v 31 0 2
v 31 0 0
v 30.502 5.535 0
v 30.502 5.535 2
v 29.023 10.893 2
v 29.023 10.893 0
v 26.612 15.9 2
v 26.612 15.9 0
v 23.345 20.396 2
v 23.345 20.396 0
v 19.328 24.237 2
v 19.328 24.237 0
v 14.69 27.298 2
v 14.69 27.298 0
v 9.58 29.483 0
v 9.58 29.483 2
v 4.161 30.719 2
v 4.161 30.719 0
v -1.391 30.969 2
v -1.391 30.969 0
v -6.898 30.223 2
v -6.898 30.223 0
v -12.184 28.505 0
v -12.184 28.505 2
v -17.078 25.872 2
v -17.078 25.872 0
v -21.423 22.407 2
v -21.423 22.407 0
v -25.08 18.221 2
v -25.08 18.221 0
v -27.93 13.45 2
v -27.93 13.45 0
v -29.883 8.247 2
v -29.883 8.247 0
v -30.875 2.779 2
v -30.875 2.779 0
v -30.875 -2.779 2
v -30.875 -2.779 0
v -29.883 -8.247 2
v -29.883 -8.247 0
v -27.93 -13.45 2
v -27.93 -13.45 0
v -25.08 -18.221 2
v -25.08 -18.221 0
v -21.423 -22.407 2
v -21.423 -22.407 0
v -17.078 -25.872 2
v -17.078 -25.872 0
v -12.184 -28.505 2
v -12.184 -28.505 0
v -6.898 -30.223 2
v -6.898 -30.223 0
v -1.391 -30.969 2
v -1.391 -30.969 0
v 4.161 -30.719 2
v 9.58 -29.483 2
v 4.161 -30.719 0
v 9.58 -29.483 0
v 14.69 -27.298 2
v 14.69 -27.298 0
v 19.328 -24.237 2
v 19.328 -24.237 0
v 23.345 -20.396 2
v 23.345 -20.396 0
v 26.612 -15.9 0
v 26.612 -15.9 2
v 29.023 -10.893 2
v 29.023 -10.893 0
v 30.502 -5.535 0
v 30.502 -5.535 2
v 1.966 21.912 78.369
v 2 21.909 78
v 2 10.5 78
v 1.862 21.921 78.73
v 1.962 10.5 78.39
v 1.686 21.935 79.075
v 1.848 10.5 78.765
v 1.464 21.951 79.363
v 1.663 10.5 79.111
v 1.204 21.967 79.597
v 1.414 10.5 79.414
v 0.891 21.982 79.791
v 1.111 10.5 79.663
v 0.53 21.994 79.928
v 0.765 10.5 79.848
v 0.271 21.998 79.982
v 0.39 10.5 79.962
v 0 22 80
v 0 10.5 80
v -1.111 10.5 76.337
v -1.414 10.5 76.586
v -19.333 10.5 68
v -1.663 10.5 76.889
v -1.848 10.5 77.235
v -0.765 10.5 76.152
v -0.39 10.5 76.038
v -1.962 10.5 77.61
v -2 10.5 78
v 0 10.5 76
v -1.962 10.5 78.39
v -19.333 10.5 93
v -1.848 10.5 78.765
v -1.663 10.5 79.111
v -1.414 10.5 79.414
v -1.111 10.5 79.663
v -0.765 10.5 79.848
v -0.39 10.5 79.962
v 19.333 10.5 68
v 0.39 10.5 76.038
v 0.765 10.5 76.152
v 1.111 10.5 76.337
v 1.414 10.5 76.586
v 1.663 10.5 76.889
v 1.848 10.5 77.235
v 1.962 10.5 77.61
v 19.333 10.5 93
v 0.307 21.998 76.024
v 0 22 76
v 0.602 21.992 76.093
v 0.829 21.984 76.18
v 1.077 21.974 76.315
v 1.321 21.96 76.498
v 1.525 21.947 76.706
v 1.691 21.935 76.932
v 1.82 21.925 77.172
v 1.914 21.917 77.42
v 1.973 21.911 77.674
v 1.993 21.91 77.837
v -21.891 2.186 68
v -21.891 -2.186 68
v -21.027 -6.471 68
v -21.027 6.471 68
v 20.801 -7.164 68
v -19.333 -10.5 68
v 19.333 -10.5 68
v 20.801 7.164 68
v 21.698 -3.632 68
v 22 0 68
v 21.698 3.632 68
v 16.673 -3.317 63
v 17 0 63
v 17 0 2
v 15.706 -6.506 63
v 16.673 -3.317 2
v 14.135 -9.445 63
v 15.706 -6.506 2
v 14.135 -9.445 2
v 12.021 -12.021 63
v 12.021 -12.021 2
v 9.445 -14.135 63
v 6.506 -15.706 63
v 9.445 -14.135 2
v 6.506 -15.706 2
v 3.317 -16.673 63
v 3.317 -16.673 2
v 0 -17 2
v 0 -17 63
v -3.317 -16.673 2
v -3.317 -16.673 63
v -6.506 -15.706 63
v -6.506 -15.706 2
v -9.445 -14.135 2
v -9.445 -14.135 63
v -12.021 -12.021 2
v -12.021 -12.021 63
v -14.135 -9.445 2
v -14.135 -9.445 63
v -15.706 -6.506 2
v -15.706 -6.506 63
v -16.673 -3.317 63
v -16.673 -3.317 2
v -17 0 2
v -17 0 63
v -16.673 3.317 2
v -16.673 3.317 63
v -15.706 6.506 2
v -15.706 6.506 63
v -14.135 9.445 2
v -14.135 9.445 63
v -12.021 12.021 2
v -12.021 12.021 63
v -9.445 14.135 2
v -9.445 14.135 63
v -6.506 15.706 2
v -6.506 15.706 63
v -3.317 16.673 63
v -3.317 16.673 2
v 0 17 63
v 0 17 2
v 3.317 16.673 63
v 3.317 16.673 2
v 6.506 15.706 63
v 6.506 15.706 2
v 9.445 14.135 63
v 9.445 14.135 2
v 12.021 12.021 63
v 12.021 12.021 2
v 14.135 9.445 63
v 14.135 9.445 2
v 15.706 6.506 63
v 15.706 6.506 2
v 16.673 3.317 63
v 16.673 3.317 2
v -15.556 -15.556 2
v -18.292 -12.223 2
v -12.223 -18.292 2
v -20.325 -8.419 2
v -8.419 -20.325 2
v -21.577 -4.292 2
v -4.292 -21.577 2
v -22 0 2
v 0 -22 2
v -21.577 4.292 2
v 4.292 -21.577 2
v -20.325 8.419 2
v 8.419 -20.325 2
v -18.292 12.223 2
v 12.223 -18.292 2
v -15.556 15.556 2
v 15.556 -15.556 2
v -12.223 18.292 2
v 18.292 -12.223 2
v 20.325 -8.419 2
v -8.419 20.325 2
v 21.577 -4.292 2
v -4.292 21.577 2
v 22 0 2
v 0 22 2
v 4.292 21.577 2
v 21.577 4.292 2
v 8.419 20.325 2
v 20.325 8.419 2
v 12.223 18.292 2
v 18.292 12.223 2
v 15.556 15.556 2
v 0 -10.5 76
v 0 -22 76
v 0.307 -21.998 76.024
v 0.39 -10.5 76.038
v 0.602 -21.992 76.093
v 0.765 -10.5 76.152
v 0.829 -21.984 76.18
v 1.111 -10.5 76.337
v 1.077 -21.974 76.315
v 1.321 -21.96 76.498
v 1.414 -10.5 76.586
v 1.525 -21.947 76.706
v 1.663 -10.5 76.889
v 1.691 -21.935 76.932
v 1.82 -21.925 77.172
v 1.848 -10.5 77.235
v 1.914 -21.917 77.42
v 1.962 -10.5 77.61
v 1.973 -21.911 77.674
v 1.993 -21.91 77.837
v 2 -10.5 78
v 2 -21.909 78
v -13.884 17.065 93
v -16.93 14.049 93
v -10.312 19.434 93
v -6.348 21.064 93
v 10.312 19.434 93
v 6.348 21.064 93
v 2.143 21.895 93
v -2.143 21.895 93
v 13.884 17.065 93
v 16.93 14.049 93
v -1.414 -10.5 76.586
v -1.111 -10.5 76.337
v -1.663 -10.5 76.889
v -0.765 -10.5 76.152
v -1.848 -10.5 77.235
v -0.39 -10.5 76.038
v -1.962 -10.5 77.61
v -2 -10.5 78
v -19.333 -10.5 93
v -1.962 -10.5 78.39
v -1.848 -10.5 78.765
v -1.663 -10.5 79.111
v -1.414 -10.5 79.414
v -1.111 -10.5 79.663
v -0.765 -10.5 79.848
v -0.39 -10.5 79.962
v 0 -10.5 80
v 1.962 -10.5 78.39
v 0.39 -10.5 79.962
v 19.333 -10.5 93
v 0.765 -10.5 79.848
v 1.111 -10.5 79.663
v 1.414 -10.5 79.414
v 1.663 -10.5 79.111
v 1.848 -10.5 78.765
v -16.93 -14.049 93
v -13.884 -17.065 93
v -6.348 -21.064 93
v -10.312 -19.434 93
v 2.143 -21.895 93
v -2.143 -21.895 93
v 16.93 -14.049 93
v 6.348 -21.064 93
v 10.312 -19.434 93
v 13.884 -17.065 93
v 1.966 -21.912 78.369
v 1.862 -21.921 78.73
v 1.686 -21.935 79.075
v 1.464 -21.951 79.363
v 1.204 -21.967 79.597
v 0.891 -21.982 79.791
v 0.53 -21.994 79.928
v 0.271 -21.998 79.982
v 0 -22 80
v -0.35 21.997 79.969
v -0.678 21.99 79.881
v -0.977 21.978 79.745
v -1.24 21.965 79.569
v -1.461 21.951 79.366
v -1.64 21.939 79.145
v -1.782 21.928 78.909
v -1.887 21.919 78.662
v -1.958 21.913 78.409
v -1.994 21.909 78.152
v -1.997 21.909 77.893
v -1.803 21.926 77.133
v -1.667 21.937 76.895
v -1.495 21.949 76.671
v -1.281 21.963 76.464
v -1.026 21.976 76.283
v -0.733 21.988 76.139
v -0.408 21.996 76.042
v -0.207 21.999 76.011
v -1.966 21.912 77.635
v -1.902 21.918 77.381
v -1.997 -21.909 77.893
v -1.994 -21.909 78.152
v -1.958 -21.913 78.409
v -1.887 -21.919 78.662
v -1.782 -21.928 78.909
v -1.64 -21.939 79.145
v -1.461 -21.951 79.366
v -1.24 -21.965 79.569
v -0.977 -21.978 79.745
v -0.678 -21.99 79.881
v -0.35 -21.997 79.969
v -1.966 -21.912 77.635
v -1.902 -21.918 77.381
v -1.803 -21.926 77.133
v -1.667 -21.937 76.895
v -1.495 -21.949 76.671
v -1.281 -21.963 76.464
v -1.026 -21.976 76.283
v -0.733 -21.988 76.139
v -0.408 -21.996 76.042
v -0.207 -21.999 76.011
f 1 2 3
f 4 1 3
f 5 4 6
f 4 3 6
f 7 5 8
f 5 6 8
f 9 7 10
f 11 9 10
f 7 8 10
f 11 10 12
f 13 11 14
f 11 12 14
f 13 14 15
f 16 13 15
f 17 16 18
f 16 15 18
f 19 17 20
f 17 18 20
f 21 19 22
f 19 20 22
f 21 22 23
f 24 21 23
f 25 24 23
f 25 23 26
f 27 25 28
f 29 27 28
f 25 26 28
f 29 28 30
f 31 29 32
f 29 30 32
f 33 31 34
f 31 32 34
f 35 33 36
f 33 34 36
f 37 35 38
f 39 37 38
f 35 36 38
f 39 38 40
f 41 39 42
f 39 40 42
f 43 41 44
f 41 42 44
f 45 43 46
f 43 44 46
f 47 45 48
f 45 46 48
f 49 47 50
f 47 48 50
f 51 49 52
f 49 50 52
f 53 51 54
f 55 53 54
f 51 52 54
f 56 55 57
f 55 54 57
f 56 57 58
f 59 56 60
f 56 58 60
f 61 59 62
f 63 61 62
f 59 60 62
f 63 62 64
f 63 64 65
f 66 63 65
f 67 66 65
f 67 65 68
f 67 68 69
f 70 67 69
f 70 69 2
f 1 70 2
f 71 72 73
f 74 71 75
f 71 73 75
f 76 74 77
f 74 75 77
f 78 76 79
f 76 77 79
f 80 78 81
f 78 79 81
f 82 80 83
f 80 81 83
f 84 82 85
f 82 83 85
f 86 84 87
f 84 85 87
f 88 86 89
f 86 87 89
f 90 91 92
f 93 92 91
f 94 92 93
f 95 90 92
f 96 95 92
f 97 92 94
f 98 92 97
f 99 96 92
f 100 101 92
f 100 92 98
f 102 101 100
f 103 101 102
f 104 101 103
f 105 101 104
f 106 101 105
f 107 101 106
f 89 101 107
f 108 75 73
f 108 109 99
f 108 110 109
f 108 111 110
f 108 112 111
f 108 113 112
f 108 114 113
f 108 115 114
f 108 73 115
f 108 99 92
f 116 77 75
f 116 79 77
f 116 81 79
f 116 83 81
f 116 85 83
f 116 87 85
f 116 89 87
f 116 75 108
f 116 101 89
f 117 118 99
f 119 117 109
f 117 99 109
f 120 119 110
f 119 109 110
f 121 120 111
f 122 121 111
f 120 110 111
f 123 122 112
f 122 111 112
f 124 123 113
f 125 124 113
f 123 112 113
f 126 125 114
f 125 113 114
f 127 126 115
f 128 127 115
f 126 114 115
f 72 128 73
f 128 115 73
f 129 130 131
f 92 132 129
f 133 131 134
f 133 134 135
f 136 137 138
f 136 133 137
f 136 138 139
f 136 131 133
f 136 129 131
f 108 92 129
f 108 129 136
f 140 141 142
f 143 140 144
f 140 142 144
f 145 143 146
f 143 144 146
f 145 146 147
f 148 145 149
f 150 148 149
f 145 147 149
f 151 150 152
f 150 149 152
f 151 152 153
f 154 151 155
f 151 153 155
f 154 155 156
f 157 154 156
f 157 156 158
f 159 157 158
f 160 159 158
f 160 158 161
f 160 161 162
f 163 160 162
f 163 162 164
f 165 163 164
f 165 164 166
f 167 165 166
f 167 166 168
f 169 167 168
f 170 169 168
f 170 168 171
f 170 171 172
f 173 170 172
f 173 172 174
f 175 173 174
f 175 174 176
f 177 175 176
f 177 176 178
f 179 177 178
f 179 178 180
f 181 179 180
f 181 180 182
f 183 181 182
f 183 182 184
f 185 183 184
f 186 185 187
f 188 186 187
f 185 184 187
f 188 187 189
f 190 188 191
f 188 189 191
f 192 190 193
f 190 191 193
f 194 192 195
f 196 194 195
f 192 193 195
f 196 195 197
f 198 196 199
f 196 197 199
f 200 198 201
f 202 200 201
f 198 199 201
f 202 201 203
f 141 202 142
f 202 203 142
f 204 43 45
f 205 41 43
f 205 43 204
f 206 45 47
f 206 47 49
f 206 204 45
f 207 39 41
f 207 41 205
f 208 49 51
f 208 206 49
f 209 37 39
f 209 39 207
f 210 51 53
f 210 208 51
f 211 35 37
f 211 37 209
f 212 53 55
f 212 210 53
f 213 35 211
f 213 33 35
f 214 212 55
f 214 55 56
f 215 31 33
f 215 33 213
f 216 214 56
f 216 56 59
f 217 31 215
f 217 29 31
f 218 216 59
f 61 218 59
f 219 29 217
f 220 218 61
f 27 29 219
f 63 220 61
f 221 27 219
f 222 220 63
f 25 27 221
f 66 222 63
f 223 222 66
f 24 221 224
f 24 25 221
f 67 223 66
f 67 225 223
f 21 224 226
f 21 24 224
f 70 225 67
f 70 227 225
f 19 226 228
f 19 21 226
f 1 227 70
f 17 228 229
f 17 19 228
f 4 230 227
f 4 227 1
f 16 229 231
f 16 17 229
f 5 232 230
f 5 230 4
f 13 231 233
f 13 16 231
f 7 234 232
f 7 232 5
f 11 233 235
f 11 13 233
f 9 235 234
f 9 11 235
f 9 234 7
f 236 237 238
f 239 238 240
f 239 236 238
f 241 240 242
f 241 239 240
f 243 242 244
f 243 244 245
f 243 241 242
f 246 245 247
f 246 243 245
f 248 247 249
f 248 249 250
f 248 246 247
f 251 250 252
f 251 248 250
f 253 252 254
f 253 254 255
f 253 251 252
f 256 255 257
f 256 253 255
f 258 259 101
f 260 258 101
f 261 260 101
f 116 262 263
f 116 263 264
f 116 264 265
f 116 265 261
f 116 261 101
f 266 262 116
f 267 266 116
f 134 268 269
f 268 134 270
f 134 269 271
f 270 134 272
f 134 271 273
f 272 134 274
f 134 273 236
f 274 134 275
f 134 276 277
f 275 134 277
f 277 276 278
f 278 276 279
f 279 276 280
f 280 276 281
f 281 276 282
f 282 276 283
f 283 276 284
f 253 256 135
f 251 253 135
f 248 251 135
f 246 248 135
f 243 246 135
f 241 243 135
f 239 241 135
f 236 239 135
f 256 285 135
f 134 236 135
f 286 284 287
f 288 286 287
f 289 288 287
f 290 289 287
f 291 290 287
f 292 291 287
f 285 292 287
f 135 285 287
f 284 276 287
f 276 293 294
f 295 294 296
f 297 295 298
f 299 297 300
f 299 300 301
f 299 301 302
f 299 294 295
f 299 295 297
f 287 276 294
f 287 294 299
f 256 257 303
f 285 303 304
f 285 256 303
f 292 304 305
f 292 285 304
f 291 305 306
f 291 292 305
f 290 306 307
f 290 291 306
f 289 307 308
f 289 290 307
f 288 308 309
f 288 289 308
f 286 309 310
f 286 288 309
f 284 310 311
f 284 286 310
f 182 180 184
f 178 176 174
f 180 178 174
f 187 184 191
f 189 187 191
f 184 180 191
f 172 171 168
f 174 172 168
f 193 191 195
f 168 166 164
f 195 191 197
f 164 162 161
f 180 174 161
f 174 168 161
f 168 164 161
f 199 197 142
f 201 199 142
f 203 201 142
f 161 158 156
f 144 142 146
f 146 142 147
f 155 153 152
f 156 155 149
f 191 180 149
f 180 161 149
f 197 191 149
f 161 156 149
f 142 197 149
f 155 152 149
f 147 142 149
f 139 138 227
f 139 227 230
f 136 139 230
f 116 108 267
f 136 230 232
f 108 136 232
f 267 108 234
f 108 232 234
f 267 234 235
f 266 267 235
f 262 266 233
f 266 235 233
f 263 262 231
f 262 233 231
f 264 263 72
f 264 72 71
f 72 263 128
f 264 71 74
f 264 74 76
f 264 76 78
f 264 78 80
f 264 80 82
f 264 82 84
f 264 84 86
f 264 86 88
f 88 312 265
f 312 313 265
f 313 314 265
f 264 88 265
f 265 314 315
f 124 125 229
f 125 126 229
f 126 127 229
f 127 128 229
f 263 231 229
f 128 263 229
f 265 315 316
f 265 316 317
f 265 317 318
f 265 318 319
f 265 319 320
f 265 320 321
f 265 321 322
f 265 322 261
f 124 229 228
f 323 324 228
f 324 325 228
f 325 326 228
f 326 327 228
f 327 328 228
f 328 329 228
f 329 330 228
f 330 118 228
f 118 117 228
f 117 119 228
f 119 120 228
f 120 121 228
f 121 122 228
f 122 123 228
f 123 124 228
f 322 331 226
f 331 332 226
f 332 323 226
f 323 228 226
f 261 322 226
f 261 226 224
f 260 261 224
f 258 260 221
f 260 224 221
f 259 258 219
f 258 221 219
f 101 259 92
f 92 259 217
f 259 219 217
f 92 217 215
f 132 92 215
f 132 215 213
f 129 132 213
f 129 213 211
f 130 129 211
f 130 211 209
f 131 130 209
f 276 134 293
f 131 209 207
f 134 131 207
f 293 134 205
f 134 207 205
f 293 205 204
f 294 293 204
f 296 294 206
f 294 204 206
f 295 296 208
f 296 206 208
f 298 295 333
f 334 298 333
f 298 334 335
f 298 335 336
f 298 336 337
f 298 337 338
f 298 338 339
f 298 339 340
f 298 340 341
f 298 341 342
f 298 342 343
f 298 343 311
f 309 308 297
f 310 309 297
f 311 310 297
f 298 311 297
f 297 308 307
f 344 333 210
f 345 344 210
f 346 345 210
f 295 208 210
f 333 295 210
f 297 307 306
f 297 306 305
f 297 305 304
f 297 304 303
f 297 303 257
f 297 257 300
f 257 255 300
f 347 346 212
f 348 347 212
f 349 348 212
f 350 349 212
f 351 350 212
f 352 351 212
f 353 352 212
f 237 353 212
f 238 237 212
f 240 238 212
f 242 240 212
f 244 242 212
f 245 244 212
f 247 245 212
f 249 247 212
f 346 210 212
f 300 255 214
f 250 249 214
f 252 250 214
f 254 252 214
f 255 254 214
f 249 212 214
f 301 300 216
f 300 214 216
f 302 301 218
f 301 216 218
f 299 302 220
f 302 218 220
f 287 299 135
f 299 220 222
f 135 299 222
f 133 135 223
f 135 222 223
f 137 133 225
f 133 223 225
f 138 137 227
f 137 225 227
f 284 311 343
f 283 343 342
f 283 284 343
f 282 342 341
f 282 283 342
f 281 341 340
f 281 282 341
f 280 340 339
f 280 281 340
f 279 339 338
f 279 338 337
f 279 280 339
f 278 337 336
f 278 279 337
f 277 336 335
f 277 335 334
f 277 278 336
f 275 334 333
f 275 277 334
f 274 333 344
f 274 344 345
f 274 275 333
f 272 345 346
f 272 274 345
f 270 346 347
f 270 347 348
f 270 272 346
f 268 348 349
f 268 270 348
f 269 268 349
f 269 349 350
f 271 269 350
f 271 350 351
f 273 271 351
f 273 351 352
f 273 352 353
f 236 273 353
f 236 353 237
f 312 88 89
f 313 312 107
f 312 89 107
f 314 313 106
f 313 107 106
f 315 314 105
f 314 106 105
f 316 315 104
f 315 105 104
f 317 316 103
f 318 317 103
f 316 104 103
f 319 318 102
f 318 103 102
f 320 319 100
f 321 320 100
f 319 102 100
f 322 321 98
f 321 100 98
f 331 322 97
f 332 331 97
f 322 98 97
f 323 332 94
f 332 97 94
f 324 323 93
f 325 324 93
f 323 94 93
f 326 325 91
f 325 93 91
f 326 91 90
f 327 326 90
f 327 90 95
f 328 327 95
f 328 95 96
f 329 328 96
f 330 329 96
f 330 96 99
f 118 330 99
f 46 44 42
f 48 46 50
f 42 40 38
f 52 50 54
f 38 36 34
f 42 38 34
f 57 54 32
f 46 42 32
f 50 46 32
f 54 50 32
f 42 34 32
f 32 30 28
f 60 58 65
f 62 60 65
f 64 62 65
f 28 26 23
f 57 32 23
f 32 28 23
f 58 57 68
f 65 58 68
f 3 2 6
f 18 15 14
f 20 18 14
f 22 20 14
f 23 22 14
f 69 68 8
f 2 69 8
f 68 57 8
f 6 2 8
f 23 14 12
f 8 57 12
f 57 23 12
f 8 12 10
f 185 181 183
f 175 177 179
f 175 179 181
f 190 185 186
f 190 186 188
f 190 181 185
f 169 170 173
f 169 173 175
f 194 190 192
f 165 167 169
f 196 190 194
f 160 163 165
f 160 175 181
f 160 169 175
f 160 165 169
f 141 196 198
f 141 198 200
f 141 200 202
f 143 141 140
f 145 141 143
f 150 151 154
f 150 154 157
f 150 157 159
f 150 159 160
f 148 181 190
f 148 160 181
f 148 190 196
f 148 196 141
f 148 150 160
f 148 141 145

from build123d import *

# Parameters (mm, degrees)
F0_R          = 31
F1_DEPTH      = 2
F2_R          = 22
F3_DEPTH      = 91
F4_W          = 67.803
F4_H          = 21
F5_DEPTH      = 25
F7_DEPTH      = 20.501
F7_DEPTH_BACK = 43.7
F8_R          = 17
F9_DEPTH      = 63
F10_R         = 31
F11_DEPTH     = 2


with BuildPart() as f1:
    # F0 (on Top) → F1 (new body)
    with BuildSketch(Plane.XY):
        Circle(F0_R)
    extrude(amount=F1_DEPTH)

    # F2 (on face) → F3 (join)
    with BuildSketch(Plane.XY.offset(2)):
        Circle(F2_R)
    extrude(amount=F3_DEPTH)

    # F4 (on face) → F5 (cut)
    with BuildSketch(Plane.XY.offset(93)):
        Rectangle(F4_W, F4_H)
    extrude(amount=-F5_DEPTH, mode=Mode.SUBTRACT)

    # F6 (on face) → F7 (cut, two sides)
    with BuildSketch(Plane.XZ.offset(-10.5)) as f7_sk:
        with BuildLine():
            ThreePointArc((0, 80), (-2, 78), (0, 76))
            Line((0, 76), (0, 78))
            Line((0, 78), (0, 80))
        make_face()
        with BuildLine():
            Line((0, 78), (0, 76))
            ThreePointArc((0, 76), (1.4142135624, 76.5857864376), (2, 78))
            ThreePointArc((2, 78), (1.4142135624, 79.4142135624), (0, 80))
            Line((0, 80), (0, 78))
        make_face()
    extrude(amount=-F7_DEPTH, mode=Mode.SUBTRACT)
    extrude(f7_sk.sketch, amount=F7_DEPTH_BACK, mode=Mode.SUBTRACT)

    # F8 (on face) → F9 (cut)
    with BuildSketch(Plane(origin=(0, 0, 0), x_dir=(1, 0, 0), z_dir=(0, 0, -1))):
        Circle(F8_R)
    extrude(amount=-F9_DEPTH, mode=Mode.SUBTRACT)

    # F10 (on face) → F11 (join)
    with BuildSketch(Plane(origin=(0, 0, 0), x_dir=(1, 0, 0), z_dir=(0, 0, -1))):
        Circle(F10_R)
    extrude(amount=-F11_DEPTH)


solid = f1.part
